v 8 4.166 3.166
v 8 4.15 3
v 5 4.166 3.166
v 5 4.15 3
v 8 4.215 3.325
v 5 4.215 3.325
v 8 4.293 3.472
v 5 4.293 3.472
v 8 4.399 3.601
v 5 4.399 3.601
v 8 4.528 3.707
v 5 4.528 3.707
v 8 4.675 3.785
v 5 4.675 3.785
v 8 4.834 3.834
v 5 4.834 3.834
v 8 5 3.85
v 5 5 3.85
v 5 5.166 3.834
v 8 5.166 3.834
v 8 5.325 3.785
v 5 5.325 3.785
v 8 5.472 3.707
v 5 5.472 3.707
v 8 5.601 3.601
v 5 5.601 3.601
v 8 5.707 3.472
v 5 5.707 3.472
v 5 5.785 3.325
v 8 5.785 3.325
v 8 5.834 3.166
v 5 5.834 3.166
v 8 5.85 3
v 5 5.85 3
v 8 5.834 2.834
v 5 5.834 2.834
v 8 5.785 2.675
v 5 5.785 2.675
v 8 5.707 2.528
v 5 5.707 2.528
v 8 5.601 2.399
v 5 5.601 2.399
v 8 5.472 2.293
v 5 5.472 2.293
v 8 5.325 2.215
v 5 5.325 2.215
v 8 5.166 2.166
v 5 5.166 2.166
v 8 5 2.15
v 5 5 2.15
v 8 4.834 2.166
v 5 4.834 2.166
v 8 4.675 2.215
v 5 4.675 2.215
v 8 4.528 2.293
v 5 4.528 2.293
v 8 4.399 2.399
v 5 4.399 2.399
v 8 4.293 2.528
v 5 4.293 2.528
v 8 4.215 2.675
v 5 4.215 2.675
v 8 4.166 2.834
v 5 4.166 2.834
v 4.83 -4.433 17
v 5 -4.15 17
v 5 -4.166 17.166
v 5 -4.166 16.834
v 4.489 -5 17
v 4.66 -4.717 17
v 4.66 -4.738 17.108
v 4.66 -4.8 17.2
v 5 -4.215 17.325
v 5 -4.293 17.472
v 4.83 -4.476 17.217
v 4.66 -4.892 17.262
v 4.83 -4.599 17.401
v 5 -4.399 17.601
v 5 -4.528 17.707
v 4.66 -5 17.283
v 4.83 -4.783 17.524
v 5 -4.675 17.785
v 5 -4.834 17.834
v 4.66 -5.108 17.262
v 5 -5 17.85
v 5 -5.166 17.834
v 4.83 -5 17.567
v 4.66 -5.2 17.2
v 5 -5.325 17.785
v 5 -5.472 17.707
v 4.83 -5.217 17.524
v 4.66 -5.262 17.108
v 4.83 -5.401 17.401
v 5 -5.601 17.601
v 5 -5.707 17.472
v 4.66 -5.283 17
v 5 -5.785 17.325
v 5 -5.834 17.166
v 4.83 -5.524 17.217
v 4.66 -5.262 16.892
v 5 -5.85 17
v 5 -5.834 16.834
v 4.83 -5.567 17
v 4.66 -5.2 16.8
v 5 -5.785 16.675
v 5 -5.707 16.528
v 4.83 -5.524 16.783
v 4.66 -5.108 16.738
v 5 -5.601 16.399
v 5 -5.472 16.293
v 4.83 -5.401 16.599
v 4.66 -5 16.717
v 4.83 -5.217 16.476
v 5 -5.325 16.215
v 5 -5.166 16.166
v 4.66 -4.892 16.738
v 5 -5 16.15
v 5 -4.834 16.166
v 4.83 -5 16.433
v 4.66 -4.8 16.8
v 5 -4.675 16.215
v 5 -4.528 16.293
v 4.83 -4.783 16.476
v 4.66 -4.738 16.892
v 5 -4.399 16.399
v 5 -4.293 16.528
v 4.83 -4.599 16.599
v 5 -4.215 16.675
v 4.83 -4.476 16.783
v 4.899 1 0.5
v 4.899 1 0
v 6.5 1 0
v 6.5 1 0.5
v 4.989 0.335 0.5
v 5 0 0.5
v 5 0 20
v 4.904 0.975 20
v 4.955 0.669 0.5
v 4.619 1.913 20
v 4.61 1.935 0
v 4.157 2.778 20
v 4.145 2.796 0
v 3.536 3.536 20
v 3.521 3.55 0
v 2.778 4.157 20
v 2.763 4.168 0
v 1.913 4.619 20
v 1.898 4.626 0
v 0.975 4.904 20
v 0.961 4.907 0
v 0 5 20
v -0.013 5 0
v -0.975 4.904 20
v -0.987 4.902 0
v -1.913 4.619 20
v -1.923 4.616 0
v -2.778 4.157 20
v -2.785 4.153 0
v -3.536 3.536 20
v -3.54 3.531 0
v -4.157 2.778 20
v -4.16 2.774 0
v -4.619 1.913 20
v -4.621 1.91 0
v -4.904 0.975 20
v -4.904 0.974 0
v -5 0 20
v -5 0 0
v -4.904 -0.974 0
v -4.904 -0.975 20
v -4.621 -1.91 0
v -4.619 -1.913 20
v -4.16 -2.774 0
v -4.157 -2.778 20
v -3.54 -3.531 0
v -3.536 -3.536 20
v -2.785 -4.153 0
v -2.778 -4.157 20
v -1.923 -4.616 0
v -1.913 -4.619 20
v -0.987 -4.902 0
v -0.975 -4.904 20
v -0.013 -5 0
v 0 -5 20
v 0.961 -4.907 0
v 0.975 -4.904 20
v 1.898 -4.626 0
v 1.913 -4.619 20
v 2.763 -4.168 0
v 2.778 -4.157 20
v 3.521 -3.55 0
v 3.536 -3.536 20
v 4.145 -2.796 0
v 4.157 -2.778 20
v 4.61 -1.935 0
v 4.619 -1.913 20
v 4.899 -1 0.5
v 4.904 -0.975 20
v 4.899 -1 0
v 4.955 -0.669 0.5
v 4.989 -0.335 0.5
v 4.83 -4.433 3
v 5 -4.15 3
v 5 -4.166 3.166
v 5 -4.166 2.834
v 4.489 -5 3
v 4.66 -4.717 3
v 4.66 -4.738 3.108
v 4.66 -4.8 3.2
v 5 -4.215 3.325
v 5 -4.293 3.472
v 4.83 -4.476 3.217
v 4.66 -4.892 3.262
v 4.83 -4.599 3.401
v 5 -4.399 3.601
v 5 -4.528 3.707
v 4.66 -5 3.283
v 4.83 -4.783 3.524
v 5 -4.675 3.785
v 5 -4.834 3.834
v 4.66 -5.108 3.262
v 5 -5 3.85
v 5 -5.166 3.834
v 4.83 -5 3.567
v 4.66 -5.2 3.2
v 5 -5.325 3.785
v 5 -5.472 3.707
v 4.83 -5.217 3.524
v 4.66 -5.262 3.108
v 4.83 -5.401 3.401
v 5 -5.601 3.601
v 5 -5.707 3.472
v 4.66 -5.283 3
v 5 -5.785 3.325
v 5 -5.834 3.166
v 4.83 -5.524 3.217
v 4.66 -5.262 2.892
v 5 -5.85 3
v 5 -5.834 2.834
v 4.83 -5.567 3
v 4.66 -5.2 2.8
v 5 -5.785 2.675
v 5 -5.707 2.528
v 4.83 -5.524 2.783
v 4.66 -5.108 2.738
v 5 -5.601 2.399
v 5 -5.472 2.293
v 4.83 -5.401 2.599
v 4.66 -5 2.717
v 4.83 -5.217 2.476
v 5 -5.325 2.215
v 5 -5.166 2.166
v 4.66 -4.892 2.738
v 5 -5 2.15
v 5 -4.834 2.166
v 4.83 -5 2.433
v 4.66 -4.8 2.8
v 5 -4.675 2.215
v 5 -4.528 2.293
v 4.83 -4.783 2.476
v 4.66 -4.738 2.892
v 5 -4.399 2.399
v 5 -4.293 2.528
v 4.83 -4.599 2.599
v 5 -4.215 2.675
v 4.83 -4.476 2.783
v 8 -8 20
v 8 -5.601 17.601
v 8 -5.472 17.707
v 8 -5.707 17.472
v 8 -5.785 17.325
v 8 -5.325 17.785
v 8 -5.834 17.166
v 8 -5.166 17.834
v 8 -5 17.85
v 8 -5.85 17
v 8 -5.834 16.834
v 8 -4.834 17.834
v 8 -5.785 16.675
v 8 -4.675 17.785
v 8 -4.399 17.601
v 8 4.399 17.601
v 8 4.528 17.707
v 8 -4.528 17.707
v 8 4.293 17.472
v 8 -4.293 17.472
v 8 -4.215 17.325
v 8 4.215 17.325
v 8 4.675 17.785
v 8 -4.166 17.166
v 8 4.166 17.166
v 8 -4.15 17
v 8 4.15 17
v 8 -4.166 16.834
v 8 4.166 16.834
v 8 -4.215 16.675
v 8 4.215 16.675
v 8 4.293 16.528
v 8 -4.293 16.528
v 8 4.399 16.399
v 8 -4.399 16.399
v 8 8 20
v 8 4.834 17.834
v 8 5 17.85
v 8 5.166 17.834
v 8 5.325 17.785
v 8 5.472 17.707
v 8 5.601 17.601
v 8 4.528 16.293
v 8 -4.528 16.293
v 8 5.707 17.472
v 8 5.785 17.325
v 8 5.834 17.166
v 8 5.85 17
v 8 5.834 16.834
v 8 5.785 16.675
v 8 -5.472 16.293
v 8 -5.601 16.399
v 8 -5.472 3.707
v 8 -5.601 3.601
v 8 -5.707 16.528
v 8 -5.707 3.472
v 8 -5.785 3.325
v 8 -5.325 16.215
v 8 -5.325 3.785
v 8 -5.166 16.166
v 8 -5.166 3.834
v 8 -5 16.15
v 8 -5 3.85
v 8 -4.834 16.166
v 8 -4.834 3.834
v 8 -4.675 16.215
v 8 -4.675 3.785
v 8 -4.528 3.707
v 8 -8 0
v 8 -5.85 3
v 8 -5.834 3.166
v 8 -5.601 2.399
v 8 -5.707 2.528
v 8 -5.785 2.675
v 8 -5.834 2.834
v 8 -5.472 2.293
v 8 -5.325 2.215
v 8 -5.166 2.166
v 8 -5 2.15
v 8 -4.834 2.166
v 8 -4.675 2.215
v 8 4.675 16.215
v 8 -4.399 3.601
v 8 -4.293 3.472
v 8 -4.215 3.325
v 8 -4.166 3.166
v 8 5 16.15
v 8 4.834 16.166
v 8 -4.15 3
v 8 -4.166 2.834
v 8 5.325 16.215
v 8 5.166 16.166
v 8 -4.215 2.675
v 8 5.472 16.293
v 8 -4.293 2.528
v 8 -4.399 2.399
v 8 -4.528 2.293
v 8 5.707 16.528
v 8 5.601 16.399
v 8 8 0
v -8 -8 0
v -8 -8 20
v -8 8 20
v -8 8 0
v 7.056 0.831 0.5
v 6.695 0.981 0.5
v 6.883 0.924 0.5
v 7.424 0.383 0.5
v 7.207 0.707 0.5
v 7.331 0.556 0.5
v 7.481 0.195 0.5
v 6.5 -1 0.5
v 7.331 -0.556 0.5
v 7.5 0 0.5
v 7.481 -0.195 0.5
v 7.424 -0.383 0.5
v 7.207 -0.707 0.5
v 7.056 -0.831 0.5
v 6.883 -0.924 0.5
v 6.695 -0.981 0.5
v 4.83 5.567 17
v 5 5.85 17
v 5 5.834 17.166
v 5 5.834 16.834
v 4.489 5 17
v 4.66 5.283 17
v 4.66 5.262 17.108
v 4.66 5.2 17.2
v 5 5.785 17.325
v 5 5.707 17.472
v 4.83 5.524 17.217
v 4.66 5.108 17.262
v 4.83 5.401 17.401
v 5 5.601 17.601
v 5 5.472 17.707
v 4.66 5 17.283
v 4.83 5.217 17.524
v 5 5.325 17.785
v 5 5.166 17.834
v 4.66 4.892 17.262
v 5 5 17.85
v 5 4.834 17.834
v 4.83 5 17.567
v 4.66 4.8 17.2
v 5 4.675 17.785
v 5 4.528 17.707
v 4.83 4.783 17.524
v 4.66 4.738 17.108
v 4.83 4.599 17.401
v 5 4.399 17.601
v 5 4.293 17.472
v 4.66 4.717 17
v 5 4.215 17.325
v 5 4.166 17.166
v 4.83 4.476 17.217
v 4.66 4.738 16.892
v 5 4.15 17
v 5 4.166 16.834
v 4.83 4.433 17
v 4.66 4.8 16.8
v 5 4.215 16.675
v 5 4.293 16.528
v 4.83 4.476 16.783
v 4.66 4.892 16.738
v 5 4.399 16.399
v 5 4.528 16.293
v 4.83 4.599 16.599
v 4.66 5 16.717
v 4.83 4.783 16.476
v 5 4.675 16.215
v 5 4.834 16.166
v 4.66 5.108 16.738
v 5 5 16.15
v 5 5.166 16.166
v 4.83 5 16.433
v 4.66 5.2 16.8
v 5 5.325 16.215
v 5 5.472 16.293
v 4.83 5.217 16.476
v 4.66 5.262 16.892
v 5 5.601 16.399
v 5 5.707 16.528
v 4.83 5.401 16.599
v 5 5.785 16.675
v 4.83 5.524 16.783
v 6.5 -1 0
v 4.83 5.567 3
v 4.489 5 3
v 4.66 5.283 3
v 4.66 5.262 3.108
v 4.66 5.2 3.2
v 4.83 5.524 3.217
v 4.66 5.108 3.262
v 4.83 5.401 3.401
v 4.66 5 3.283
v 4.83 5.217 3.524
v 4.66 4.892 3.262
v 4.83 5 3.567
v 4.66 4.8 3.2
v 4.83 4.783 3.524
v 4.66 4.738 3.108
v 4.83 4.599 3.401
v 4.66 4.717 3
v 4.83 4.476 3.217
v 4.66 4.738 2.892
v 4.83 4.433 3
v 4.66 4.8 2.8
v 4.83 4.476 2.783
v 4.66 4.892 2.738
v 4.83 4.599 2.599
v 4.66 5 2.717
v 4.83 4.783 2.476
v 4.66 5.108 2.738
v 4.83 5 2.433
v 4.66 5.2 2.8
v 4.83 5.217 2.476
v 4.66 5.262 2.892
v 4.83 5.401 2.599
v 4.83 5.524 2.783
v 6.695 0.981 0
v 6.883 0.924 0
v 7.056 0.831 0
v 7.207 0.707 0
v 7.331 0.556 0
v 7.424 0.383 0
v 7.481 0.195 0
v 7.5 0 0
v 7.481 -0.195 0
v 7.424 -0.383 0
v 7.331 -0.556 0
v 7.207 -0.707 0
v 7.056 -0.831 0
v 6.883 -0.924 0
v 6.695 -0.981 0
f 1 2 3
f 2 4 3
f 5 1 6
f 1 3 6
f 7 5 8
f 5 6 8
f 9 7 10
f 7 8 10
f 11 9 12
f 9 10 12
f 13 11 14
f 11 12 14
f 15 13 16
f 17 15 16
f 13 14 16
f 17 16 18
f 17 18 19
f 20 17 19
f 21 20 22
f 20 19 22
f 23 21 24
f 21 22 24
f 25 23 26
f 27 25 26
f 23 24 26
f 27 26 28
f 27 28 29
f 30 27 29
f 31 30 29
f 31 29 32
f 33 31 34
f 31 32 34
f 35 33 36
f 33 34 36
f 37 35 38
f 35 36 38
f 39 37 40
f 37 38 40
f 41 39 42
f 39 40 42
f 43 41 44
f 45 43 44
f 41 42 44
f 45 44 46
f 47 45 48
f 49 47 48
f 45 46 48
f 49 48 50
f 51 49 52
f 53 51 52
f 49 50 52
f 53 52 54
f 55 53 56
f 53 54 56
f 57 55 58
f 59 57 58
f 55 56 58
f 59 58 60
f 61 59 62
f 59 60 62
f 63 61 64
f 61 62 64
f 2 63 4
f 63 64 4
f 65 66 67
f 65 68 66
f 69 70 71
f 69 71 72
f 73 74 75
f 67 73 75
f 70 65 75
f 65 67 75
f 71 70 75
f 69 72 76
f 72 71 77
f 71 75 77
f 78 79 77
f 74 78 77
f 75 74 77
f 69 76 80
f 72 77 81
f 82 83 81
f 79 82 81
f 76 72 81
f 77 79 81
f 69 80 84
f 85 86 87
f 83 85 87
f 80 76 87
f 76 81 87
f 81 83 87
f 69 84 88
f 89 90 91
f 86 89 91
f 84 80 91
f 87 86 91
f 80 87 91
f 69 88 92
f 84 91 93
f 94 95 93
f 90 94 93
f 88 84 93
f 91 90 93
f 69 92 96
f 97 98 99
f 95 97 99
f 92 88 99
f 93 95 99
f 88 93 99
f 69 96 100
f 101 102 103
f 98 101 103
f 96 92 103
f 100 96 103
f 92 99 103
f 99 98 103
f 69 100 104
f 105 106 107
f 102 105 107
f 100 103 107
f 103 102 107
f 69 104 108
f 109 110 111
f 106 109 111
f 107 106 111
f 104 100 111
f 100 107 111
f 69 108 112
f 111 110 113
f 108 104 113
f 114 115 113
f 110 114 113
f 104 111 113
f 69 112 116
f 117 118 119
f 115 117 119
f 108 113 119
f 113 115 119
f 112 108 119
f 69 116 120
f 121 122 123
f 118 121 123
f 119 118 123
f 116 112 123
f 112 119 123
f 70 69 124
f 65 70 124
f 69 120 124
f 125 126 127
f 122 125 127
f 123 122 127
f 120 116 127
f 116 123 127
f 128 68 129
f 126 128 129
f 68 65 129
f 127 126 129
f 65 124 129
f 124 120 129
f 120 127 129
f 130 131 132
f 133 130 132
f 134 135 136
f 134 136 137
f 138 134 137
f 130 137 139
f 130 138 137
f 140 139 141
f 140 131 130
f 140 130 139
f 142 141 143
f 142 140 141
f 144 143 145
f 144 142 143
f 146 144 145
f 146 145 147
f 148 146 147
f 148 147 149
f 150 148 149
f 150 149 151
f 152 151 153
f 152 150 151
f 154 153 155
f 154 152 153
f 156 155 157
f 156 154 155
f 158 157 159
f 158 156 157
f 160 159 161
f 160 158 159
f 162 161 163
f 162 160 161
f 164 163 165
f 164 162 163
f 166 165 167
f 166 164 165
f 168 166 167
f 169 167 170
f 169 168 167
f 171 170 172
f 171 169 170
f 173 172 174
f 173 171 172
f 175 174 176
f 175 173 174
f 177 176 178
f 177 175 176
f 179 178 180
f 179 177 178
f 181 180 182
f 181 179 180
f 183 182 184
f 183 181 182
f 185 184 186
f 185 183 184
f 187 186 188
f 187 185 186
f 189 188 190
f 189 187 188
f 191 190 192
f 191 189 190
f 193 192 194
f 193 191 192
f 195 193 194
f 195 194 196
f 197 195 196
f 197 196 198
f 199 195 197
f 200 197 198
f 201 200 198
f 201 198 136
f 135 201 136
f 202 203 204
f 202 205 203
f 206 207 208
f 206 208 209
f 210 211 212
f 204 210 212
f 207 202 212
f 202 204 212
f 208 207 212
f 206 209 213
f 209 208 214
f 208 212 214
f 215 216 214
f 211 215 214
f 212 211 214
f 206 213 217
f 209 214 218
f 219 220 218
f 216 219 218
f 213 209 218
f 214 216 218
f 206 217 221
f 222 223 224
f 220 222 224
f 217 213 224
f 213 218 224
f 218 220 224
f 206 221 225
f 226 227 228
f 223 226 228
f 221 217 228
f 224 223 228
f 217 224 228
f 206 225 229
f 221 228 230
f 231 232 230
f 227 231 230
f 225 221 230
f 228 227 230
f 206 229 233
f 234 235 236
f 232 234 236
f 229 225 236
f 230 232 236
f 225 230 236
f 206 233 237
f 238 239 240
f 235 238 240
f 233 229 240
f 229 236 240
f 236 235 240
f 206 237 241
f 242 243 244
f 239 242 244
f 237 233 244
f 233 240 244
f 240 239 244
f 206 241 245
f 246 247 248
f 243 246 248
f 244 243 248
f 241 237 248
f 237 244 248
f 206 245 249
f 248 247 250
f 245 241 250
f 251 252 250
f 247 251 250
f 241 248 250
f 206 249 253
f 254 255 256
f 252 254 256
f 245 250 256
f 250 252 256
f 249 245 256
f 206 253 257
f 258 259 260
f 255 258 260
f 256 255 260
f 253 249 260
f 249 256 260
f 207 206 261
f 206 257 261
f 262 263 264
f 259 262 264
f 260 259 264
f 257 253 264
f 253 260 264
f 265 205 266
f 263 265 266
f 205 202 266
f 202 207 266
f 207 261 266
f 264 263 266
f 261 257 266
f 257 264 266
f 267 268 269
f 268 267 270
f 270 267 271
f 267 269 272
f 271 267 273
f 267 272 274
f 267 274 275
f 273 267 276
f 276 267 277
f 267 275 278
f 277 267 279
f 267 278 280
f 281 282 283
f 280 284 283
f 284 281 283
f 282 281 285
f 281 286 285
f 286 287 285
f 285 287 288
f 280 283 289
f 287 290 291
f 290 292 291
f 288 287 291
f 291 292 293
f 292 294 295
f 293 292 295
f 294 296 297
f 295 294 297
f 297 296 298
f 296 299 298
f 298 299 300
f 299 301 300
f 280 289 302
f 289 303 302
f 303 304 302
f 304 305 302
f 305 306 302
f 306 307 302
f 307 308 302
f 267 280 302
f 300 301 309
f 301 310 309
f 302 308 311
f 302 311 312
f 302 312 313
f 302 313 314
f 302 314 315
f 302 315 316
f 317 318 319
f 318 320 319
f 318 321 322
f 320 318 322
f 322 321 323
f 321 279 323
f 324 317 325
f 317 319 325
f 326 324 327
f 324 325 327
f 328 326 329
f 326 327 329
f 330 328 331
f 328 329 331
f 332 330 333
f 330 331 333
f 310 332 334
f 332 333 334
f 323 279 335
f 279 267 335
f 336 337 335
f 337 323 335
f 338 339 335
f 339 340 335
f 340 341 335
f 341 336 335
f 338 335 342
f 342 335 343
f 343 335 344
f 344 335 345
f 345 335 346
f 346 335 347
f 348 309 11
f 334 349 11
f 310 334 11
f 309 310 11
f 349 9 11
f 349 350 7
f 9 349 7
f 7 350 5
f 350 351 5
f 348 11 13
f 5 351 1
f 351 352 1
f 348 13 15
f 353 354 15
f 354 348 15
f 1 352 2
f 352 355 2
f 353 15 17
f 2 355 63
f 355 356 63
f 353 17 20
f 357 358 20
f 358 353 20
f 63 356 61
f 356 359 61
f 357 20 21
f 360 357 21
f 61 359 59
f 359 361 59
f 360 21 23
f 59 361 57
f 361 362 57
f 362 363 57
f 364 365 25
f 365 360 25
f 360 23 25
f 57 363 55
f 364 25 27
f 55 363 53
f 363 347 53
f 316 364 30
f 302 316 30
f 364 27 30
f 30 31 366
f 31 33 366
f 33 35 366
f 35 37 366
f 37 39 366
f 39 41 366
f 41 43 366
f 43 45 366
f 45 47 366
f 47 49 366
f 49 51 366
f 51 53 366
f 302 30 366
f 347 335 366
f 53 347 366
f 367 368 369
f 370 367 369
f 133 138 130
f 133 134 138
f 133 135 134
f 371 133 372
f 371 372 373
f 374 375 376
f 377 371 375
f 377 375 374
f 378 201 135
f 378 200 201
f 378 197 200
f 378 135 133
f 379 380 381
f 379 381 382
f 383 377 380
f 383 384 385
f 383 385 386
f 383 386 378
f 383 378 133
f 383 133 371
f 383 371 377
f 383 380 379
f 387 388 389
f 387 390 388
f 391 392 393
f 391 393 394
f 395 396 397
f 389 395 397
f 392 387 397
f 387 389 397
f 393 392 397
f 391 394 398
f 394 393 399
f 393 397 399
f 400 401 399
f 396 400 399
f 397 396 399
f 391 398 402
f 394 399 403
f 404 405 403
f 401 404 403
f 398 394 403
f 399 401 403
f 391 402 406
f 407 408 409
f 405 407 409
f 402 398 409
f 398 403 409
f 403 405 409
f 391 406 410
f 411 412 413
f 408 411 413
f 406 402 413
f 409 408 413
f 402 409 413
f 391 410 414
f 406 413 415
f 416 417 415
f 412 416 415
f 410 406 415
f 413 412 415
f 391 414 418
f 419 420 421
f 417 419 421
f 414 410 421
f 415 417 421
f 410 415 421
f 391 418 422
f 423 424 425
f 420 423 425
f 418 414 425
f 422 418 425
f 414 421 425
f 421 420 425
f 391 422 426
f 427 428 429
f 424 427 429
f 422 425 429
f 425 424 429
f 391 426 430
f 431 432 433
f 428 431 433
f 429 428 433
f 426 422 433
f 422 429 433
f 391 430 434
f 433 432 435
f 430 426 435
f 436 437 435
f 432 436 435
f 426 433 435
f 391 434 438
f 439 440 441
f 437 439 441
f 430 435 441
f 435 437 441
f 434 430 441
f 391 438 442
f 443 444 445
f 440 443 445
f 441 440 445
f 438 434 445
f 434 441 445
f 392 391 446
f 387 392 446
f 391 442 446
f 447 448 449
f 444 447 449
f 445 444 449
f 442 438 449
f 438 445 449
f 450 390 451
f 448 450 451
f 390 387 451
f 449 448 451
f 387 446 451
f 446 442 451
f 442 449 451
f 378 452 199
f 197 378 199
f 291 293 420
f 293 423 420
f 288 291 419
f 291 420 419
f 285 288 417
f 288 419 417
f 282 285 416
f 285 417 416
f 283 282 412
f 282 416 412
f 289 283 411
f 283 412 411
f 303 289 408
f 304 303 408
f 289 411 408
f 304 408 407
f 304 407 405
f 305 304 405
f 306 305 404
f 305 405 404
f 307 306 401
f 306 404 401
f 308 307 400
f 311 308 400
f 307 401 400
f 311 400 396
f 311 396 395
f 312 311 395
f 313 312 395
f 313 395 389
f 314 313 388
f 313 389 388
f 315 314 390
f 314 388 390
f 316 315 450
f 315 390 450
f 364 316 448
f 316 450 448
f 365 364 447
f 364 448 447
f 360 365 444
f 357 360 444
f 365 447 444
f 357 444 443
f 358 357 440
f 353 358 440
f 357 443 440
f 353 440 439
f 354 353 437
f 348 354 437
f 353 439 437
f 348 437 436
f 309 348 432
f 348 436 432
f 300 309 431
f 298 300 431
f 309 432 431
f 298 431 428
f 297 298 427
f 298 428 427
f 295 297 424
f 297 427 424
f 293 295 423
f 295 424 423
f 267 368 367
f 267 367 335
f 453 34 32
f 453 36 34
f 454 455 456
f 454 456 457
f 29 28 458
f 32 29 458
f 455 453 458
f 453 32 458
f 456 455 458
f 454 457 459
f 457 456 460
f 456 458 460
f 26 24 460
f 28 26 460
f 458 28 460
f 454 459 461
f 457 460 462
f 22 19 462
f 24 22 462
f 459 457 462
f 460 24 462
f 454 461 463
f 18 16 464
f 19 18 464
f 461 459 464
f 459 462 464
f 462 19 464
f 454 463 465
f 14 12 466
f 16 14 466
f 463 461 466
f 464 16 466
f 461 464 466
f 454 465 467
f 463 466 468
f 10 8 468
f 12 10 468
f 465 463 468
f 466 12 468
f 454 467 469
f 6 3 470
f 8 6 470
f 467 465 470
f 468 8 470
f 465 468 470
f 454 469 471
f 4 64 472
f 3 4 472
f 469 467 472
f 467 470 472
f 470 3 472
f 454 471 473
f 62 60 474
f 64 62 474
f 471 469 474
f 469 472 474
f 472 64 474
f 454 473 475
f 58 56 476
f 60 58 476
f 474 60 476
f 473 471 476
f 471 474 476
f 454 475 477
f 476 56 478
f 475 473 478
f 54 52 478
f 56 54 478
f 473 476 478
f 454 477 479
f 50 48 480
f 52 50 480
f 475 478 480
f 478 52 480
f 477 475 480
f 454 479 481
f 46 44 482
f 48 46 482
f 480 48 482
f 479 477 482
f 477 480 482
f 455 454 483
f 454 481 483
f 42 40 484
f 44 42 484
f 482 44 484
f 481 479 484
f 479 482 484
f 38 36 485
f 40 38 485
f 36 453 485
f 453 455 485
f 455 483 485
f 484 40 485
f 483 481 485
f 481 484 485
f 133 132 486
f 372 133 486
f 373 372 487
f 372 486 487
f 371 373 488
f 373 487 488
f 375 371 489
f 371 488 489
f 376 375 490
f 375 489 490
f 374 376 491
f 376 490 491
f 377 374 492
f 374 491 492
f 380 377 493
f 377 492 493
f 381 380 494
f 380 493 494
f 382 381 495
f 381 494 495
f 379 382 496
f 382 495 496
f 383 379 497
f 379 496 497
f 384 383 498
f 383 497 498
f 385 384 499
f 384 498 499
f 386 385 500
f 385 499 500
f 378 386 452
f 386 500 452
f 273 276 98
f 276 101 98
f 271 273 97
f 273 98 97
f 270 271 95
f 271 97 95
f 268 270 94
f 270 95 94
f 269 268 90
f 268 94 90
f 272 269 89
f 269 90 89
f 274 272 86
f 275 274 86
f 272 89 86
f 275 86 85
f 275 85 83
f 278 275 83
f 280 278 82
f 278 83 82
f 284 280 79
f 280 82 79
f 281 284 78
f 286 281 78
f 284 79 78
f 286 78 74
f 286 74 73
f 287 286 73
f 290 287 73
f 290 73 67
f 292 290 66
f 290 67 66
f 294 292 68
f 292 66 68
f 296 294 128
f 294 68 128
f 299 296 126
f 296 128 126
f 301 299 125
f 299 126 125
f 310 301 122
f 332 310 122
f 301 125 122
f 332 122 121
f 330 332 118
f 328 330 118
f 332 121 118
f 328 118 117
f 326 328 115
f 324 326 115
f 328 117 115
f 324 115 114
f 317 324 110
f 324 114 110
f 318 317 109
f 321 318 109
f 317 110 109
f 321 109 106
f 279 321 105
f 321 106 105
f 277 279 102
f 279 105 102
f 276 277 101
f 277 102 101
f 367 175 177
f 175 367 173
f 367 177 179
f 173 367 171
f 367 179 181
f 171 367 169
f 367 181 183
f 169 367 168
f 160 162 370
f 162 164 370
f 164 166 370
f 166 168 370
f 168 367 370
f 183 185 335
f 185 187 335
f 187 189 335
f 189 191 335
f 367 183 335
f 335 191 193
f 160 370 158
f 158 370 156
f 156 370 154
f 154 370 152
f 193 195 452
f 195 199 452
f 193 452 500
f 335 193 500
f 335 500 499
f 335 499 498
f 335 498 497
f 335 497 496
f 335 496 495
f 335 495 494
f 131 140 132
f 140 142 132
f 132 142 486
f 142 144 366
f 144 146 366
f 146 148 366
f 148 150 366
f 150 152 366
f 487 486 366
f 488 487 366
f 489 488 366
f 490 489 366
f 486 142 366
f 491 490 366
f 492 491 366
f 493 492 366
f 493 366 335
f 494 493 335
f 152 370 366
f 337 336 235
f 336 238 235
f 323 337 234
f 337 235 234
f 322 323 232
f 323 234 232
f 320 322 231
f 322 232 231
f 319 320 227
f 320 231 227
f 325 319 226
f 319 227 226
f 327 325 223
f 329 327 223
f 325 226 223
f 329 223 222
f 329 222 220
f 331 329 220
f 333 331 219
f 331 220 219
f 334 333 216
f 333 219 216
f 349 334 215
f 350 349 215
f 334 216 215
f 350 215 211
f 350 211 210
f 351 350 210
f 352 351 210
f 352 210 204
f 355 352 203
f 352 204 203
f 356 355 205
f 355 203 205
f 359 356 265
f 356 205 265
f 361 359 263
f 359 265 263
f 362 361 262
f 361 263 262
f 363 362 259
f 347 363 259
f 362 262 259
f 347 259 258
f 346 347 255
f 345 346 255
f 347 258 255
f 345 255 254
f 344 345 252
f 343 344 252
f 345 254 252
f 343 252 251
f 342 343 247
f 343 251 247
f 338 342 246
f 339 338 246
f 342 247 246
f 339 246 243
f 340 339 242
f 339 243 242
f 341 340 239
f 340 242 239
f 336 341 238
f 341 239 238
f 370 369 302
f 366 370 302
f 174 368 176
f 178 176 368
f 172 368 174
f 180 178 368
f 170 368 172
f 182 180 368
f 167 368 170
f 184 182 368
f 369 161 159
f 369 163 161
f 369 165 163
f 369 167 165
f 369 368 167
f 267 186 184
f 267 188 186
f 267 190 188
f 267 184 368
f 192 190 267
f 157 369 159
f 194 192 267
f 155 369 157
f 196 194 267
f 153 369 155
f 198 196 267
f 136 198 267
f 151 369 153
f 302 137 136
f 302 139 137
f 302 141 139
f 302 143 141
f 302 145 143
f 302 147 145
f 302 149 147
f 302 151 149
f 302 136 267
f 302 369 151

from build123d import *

# Parameters (mm, degrees)
F0_W     = 16
F0_H     = 16
F0_R     = 5
F1_DEPTH = 20
F3_D     = 1.7
F3_DEPTH = 3
F3_TIP   = 0.5107315262
F5_DEPTH = 0.5


with BuildPart() as f1:
    # F0 (on Top) → F1 (new body)
    with BuildSketch(Plane.XY):
        Rectangle(F0_W, F0_H)
        Circle(F0_R, mode=Mode.SUBTRACT)
    extrude(amount=F1_DEPTH)

    # F3
    with Locations(Plane.YZ.offset(8)):
        with Locations((-5, 17), (5, 17), (5, 3), (-5, 3)):
            Hole(F3_D / 2, depth=F3_DEPTH)
            with Locations((0, 0, -(F3_DEPTH + F3_TIP / 2))):  # 118° drill point
                Cone(0, F3_D / 2, F3_TIP, mode=Mode.SUBTRACT)

    # F4 (on face) → F5 (cut)
    with BuildSketch(Plane(origin=(0, 0, 0), x_dir=(1, 0, 0), z_dir=(0, 0, -1))):
        with BuildLine():
            Line((0, -1), (6.5, -1))
            ThreePointArc((6.5, -1), (7.5, 0), (6.5, 1))
            Line((6.5, 1), (0, 1))
            Line((0, 1), (0, -1))
        make_face()
    extrude(amount=-F5_DEPTH, mode=Mode.SUBTRACT)


solid = f1.part
